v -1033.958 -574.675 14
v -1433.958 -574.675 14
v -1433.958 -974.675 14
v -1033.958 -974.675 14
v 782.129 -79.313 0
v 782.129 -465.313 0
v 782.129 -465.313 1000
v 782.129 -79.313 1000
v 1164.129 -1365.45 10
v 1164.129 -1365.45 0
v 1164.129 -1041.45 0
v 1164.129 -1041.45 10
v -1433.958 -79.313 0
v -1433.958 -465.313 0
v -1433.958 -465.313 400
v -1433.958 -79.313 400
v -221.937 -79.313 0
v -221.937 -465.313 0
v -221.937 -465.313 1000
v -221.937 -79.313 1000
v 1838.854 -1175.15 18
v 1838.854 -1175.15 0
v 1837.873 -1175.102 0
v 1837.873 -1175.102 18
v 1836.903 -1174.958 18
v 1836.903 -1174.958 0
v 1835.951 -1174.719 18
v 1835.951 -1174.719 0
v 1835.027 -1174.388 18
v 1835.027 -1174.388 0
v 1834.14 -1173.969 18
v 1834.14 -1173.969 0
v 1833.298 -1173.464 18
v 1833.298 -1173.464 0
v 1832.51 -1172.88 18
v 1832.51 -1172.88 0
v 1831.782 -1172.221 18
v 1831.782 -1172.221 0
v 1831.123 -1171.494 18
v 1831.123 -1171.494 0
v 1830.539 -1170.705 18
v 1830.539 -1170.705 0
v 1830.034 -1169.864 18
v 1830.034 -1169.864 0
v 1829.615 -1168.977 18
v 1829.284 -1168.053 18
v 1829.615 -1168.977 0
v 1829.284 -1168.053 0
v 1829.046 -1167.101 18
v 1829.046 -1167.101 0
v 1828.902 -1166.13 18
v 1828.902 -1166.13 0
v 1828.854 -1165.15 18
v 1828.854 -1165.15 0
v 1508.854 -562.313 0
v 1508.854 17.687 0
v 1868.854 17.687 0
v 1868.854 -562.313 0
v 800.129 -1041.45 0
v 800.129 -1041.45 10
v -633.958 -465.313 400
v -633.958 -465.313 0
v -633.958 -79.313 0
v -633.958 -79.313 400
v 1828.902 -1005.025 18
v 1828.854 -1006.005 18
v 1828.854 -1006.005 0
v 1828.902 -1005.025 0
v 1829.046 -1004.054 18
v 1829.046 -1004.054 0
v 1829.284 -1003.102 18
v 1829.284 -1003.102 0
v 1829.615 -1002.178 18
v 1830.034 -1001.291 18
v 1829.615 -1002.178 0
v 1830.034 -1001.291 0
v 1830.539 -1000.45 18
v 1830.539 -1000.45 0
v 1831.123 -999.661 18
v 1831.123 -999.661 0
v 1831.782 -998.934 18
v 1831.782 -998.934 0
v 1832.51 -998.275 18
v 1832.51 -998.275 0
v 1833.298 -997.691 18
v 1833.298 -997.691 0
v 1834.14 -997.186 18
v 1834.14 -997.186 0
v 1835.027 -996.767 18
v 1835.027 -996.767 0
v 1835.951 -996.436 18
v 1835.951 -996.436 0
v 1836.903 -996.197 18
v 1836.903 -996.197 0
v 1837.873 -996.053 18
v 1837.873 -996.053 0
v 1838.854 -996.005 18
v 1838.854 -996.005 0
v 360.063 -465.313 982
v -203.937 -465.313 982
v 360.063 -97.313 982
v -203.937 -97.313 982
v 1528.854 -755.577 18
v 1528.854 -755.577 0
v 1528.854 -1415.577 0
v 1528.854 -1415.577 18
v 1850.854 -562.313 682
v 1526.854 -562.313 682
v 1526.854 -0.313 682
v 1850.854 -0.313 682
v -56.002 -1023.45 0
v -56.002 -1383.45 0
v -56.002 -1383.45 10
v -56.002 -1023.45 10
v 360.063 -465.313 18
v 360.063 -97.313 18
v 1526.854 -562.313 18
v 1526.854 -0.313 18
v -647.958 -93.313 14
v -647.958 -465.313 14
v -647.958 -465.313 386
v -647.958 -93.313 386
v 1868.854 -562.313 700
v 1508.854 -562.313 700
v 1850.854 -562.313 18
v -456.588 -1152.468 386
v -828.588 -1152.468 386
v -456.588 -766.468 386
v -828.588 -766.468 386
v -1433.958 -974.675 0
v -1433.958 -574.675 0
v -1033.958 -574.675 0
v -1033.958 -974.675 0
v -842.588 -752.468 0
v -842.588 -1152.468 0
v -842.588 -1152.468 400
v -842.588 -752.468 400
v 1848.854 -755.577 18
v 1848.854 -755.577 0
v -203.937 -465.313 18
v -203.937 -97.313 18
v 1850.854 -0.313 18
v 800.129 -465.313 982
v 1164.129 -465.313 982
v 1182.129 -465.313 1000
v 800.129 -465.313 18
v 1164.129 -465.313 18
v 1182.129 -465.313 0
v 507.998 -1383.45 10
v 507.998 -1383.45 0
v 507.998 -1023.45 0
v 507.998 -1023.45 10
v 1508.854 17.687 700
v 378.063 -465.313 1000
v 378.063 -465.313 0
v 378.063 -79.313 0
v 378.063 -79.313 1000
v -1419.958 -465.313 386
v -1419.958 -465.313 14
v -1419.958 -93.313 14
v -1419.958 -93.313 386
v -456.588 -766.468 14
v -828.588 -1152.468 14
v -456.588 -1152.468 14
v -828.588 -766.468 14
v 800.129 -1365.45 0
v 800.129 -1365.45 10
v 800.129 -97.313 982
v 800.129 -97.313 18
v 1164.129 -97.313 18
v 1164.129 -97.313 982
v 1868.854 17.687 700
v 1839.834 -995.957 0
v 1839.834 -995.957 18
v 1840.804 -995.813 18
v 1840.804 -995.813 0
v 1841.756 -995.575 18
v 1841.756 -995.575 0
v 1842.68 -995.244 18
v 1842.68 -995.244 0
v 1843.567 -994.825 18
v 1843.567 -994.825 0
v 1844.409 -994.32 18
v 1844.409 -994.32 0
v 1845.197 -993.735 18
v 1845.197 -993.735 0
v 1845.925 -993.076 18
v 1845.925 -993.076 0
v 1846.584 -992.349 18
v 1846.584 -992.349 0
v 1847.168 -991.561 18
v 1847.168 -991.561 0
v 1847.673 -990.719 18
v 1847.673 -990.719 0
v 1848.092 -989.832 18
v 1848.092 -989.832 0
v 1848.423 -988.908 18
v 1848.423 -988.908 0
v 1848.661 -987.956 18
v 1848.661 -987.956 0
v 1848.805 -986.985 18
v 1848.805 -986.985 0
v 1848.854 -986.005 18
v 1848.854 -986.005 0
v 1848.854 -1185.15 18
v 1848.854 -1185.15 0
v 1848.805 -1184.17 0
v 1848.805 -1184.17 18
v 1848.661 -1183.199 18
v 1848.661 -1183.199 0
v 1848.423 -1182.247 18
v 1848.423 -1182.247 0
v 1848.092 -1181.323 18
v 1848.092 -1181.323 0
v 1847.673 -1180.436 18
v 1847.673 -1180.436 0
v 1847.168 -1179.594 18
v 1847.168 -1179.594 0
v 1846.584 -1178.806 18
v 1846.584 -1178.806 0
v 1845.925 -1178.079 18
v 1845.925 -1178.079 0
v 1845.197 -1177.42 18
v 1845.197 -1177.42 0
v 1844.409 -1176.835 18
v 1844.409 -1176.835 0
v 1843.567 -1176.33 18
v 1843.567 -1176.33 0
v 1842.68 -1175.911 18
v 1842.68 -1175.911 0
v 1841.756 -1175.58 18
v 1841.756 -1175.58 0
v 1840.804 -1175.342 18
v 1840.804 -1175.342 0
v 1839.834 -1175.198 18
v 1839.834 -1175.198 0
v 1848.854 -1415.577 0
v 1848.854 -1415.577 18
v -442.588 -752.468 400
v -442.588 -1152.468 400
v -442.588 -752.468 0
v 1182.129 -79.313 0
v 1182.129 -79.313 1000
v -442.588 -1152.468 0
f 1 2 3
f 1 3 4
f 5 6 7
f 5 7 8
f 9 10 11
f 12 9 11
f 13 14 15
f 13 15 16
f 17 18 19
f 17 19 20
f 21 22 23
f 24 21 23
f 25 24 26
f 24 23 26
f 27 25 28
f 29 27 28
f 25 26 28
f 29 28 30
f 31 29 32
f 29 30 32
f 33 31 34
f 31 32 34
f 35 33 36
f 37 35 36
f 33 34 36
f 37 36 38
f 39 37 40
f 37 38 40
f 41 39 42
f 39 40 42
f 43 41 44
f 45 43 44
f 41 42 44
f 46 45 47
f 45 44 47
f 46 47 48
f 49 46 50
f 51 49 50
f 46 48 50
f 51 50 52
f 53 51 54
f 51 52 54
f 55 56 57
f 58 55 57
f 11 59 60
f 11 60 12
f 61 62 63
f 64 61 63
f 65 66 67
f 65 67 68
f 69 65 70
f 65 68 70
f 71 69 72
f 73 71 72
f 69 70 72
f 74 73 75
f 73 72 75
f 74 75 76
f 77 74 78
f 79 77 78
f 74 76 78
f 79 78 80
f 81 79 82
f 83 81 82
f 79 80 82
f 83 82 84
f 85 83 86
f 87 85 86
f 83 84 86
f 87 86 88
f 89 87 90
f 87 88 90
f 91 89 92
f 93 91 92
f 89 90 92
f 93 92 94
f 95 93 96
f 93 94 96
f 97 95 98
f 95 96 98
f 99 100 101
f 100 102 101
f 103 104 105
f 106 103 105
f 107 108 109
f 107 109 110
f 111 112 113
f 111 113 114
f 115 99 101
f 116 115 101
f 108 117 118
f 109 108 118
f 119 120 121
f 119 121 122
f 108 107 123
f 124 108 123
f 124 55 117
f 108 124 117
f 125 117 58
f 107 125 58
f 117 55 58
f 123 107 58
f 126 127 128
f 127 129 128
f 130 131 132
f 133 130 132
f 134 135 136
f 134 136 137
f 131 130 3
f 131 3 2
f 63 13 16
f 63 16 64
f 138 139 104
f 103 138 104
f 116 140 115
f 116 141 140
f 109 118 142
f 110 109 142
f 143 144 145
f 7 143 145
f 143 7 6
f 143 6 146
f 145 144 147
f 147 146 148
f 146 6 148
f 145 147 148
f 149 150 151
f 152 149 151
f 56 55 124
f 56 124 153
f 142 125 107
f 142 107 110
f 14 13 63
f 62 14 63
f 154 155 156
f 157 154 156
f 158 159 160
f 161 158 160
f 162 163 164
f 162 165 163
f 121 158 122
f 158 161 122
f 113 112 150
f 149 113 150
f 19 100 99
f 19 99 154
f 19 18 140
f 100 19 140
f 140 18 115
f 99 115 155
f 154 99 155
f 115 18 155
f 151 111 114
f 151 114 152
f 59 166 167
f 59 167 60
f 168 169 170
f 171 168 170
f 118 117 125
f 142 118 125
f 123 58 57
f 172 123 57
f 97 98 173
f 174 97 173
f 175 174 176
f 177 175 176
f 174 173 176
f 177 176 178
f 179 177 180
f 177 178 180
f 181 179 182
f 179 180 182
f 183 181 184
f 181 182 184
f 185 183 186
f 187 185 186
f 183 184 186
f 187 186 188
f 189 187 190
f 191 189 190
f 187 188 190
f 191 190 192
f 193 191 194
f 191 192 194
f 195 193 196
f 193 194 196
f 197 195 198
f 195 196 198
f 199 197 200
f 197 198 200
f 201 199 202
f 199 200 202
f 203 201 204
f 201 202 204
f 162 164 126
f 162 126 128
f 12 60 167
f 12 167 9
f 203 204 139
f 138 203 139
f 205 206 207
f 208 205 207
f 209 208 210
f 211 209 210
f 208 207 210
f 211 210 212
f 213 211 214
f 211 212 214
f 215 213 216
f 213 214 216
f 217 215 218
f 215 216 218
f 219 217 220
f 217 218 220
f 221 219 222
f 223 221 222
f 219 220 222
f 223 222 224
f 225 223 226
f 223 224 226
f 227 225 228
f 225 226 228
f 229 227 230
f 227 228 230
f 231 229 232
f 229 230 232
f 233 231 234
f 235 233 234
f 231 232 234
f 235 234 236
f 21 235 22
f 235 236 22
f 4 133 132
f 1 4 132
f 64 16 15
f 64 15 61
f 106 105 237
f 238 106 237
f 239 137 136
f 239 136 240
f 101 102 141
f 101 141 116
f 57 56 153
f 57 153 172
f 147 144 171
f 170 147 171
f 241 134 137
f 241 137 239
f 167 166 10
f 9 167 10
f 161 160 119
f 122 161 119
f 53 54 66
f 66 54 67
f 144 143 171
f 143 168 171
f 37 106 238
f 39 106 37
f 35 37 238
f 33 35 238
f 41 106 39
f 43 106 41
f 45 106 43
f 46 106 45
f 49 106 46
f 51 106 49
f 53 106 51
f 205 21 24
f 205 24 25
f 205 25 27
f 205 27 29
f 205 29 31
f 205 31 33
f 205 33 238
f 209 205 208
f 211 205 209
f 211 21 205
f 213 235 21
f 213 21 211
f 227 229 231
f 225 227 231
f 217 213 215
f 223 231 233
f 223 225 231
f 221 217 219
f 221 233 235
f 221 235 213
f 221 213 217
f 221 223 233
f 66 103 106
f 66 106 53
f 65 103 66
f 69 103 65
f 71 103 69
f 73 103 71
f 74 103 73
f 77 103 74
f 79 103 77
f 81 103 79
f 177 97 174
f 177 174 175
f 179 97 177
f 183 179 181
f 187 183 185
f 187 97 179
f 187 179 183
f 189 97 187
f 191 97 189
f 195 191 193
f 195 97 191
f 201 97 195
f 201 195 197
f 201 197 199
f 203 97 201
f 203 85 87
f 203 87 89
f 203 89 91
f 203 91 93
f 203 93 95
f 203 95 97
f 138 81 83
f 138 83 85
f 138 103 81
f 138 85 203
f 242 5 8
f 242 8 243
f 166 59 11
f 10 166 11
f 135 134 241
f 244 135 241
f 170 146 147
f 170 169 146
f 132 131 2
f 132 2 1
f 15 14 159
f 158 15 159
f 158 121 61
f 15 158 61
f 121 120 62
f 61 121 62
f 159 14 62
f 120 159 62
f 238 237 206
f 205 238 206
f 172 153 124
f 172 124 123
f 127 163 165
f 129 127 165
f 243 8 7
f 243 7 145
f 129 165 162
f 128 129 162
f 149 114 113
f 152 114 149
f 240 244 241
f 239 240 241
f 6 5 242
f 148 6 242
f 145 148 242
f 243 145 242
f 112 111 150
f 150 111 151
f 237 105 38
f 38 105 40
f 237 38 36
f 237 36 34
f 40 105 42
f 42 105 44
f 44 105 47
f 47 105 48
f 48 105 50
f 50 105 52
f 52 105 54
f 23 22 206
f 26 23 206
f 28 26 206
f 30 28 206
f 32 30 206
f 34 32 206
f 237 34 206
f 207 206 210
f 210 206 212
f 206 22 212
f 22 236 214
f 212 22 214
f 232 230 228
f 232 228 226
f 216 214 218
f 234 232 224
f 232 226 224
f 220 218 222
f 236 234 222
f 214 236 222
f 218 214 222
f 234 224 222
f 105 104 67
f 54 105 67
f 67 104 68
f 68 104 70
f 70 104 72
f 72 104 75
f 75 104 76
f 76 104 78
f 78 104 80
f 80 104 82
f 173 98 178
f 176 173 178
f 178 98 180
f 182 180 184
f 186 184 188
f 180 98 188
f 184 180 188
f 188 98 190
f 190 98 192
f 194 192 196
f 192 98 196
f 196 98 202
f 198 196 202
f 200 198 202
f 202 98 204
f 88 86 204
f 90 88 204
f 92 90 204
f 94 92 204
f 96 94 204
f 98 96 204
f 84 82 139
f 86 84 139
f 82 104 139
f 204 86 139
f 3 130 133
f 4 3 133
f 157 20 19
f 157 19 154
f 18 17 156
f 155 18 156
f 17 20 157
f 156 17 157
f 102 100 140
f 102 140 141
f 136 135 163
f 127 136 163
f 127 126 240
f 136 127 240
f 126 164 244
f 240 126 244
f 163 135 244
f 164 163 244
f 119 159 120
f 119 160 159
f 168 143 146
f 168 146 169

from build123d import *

# Parameters (mm, degrees)
F0_W     = 600
F0_H     = 386
F1_DEPTH = 1000
F0_W_2   = 400
F2_T     = -18
F2_2_T   = -18
F0_W_3   = 564
F0_H_2   = 360
F3_DEPTH = 10
F0_W_4   = 364
F0_H_3   = 324
F0_W_5   = 360
F0_H_4   = 580
F4_DEPTH = 700
F5_T     = -18
F6_DEPTH = 18
F0_H_5   = 400
F7_DEPTH = 14
F0_W_6   = 800
F8_DEPTH = 400
F9_T     = -14
F9_2_T   = -14


with BuildPart() as f1:
    # F0 (on Top) → F1 (new body)
    with BuildSketch(Plane.XY):
        with Locations((78.0625641346, -272.3132547994)):
            Rectangle(F0_W, F0_H)
    extrude(amount=F1_DEPTH)

    # F2
    f2_openings = [f1.faces().sort_by_distance(p)[0] for p in [
        (78.062564, -465.313255, 500),
    ]]
    offset(amount=F2_T, openings=f2_openings)


with BuildPart() as f1b:
    # F0 (on Top) → F1, piece 2 (new body)
    with BuildSketch(Plane.XY):
        with Locations((982.1294546127, -272.3132547994)):
            Rectangle(F0_W_2, F0_H)
    extrude(amount=F1_DEPTH)

    # F2#2
    f2_2_openings = [f1b.faces().sort_by_distance(p)[0] for p in [
        (982.129455, -465.313255, 500),
    ]]
    offset(amount=F2_2_T, openings=f2_2_openings)


with BuildPart() as f3:
    # F0 (on Top) → F3 (new body)
    with BuildSketch(Plane.XY):
        with Locations((225.9982175827, -1203.4499120712)):
            Rectangle(F0_W_3, F0_H_2)
    extrude(amount=F3_DEPTH)


with BuildPart() as f3b:
    # F0 (on Top) → F3, piece 2 (new body)
    with BuildSketch(Plane.XY):
        with Locations((982.1294546127, -1203.4499120712)):
            Rectangle(F0_W_4, F0_H_3)
    extrude(amount=F3_DEPTH)


with BuildPart() as f4:
    # F0 (on Top) → F4 (new body)
    with BuildSketch(Plane.XY):
        with Locations((1688.8535022736, -272.3132547994)):
            Rectangle(F0_W_5, F0_H_4)
    extrude(amount=F4_DEPTH)

    # F5
    f5_openings = [f4.faces().sort_by_distance(p)[0] for p in [
        (1688.853502, -562.313255, 350),
    ]]
    offset(amount=F5_T, openings=f5_openings)


with BuildPart() as f6:
    # F0 (on Top) → F6 (new body)
    with BuildSketch(Plane.XY):
        with BuildLine():
            Line((1848.8535022736, -986.0052967072), (1848.8535022736, -755.5774879456))
            Line((1848.8535022736, -755.5774879456), (1528.8535022736, -755.5774879456))
            Line((1528.8535022736, -755.5774879456), (1528.8535022736, -1415.5774879456))
            Line((1528.8535022736, -1415.5774879456), (1848.8535022736, -1415.5774879456))
            Line((1848.8535022736, -1415.5774879456), (1848.8535022736, -1185.149679184))
            ThreePointArc((1848.8535022736, -1185.149679184), (1845.9245700854, -1178.0786113721), (1838.8535022736, -1175.149679184))
            ThreePointArc((1838.8535022736, -1175.149679184), (1831.7824344617, -1172.2207469958), (1828.8535022736, -1165.149679184))
            Line((1828.8535022736, -1165.149679184), (1828.8535022736, -1006.0052967072))
            ThreePointArc((1828.8535022736, -1006.0052967072), (1831.7824344617, -998.9342288953), (1838.8535022736, -996.0052967072))
            ThreePointArc((1838.8535022736, -996.0052967072), (1845.9245700854, -993.076364519), (1848.8535022736, -986.0052967072))
        make_face()
    extrude(amount=F6_DEPTH)


with BuildPart() as f7:
    # F0 (on Top) → F7 (new body)
    with BuildSketch(Plane.XY):
        with Locations((-1233.95819664, -774.6752672195)):
            Rectangle(F0_W_2, F0_H_5)
    extrude(amount=F7_DEPTH)


with BuildPart() as f8:
    # F0 (on Top) → F8 (new body)
    with BuildSketch(Plane.XY):
        with Locations((-1033.95819664, -272.3132547994)):
            Rectangle(F0_W_6, F0_H)
    extrude(amount=F8_DEPTH)

    # F9
    f9_openings = [f8.faces().sort_by_distance(p)[0] for p in [
        (-1033.958197, -465.313255, 200),
    ]]
    offset(amount=F9_T, openings=f9_openings)


with BuildPart() as f8b:
    # F0 (on Top) → F8, piece 2 (new body)
    with BuildSketch(Plane.XY):
        with Locations((-642.5880610943, -952.4678468704)):
            Rectangle(F0_W_2, F0_H_5)
    extrude(amount=F8_DEPTH)

    # F9#2
    f9_2_openings = [f8b.faces().sort_by_distance(p)[0] for p in [
        (-642.588061, -1152.467847, 200),
    ]]
    offset(amount=F9_2_T, openings=f9_2_openings)


solid = Compound([f1.part, f1b.part, f3.part, f3b.part, f4.part, f6.part, f7.part, f8.part, f8b.part])
